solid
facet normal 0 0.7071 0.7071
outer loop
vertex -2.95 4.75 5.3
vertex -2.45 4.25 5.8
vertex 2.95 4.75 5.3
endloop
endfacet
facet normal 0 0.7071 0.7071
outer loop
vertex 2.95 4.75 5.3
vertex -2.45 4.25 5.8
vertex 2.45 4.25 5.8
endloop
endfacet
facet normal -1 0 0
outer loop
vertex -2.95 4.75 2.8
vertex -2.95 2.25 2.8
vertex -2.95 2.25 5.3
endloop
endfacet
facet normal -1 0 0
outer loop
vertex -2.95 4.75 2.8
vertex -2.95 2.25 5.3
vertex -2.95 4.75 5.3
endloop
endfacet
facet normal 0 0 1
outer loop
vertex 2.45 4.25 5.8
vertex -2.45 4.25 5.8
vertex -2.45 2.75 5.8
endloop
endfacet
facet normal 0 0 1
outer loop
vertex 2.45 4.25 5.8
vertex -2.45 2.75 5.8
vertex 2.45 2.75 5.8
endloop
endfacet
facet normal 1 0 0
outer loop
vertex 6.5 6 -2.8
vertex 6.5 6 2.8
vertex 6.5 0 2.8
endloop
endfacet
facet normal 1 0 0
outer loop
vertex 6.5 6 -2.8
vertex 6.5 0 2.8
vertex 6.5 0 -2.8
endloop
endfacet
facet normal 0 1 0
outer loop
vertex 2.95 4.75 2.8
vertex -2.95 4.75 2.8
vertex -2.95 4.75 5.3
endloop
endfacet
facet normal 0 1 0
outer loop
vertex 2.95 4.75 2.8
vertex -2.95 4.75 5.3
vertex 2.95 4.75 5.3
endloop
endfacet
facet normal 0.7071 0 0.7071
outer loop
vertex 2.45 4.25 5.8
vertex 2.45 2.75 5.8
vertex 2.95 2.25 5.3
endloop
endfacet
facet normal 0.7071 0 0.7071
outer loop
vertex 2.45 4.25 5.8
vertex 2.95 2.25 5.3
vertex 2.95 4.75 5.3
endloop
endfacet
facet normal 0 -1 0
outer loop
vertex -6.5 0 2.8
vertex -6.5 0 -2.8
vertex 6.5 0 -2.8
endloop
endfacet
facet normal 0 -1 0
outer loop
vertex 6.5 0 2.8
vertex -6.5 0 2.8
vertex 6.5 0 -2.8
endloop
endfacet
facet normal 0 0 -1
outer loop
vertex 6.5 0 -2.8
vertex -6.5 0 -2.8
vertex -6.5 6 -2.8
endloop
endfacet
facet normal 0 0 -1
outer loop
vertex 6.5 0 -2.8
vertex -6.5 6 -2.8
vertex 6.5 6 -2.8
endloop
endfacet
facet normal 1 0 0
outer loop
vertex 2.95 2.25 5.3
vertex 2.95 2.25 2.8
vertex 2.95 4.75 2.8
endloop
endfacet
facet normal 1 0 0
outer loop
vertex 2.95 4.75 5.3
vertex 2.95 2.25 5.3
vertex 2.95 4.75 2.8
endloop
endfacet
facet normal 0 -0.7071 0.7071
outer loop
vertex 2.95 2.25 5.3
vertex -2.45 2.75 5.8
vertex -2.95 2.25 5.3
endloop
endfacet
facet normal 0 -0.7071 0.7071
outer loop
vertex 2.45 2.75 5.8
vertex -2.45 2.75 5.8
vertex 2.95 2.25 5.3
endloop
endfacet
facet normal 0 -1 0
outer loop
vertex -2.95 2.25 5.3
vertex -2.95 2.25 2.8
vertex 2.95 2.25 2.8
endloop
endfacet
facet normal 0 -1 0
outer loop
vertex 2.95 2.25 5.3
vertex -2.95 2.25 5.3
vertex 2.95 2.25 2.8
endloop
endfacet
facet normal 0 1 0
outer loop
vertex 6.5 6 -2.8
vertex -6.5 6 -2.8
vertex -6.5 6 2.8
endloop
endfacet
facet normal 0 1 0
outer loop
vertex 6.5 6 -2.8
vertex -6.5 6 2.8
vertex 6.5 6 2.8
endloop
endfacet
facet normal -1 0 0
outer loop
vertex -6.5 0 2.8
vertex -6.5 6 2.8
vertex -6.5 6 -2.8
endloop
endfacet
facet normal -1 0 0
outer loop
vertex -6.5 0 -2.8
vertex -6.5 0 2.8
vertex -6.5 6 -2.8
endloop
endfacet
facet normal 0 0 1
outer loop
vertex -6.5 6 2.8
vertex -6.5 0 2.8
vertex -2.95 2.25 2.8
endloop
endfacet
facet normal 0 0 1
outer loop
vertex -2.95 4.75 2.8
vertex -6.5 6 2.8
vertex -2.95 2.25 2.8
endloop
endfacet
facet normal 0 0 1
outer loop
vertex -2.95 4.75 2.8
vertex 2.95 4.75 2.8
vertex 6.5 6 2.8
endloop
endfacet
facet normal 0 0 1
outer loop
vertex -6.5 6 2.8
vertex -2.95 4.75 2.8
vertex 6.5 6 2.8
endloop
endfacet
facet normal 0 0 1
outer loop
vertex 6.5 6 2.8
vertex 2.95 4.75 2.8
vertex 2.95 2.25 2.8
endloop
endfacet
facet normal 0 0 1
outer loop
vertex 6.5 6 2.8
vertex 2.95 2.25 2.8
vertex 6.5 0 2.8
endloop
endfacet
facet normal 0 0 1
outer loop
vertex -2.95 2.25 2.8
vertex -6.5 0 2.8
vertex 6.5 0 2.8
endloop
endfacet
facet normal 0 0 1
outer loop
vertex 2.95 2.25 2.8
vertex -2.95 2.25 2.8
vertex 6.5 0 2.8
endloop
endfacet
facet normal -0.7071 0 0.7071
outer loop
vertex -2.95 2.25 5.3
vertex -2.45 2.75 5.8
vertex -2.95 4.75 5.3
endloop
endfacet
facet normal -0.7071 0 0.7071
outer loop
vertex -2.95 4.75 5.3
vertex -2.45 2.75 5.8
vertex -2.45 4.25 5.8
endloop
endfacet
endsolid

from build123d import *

# Parameters (mm, degrees)
SKETCH1_W           = 13
SKETCH1_H           = 5.6
BOSS_EXTRUDE1_DEPTH = 6
SKETCH2_W           = 5.9
SKETCH2_H           = 2.5
BOSS_EXTRUDE2_DEPTH = 3
CHAMFER1_SIZE       = 0.5


with BuildPart() as part:
    # Sketch1 → Boss-Extrude1 (new body)
    with BuildSketch(Plane(origin=(0, 0, 0), x_dir=(1, 0, 0), z_dir=(0, 1, 0))):
        Rectangle(SKETCH1_W, SKETCH1_H)
    extrude(amount=BOSS_EXTRUDE1_DEPTH)

    # Sketch2 → Boss-Extrude2 (add)
    with BuildSketch(Plane.XY.offset(2.8)):
        with Locations((0, 3.5)):
            Rectangle(SKETCH2_W, SKETCH2_H)
    extrude(amount=BOSS_EXTRUDE2_DEPTH)

    # Chamfer1
    chamfer1_edges = [part.edges().sort_by_distance(p)[0] for p in [
        (2.95, 3.5, 5.8),
        (0, 4.75, 5.8),
        (-2.95, 3.5, 5.8),
        (0, 2.25, 5.8),
    ]]
    chamfer(chamfer1_edges, length=CHAMFER1_SIZE)


solid = part.part
